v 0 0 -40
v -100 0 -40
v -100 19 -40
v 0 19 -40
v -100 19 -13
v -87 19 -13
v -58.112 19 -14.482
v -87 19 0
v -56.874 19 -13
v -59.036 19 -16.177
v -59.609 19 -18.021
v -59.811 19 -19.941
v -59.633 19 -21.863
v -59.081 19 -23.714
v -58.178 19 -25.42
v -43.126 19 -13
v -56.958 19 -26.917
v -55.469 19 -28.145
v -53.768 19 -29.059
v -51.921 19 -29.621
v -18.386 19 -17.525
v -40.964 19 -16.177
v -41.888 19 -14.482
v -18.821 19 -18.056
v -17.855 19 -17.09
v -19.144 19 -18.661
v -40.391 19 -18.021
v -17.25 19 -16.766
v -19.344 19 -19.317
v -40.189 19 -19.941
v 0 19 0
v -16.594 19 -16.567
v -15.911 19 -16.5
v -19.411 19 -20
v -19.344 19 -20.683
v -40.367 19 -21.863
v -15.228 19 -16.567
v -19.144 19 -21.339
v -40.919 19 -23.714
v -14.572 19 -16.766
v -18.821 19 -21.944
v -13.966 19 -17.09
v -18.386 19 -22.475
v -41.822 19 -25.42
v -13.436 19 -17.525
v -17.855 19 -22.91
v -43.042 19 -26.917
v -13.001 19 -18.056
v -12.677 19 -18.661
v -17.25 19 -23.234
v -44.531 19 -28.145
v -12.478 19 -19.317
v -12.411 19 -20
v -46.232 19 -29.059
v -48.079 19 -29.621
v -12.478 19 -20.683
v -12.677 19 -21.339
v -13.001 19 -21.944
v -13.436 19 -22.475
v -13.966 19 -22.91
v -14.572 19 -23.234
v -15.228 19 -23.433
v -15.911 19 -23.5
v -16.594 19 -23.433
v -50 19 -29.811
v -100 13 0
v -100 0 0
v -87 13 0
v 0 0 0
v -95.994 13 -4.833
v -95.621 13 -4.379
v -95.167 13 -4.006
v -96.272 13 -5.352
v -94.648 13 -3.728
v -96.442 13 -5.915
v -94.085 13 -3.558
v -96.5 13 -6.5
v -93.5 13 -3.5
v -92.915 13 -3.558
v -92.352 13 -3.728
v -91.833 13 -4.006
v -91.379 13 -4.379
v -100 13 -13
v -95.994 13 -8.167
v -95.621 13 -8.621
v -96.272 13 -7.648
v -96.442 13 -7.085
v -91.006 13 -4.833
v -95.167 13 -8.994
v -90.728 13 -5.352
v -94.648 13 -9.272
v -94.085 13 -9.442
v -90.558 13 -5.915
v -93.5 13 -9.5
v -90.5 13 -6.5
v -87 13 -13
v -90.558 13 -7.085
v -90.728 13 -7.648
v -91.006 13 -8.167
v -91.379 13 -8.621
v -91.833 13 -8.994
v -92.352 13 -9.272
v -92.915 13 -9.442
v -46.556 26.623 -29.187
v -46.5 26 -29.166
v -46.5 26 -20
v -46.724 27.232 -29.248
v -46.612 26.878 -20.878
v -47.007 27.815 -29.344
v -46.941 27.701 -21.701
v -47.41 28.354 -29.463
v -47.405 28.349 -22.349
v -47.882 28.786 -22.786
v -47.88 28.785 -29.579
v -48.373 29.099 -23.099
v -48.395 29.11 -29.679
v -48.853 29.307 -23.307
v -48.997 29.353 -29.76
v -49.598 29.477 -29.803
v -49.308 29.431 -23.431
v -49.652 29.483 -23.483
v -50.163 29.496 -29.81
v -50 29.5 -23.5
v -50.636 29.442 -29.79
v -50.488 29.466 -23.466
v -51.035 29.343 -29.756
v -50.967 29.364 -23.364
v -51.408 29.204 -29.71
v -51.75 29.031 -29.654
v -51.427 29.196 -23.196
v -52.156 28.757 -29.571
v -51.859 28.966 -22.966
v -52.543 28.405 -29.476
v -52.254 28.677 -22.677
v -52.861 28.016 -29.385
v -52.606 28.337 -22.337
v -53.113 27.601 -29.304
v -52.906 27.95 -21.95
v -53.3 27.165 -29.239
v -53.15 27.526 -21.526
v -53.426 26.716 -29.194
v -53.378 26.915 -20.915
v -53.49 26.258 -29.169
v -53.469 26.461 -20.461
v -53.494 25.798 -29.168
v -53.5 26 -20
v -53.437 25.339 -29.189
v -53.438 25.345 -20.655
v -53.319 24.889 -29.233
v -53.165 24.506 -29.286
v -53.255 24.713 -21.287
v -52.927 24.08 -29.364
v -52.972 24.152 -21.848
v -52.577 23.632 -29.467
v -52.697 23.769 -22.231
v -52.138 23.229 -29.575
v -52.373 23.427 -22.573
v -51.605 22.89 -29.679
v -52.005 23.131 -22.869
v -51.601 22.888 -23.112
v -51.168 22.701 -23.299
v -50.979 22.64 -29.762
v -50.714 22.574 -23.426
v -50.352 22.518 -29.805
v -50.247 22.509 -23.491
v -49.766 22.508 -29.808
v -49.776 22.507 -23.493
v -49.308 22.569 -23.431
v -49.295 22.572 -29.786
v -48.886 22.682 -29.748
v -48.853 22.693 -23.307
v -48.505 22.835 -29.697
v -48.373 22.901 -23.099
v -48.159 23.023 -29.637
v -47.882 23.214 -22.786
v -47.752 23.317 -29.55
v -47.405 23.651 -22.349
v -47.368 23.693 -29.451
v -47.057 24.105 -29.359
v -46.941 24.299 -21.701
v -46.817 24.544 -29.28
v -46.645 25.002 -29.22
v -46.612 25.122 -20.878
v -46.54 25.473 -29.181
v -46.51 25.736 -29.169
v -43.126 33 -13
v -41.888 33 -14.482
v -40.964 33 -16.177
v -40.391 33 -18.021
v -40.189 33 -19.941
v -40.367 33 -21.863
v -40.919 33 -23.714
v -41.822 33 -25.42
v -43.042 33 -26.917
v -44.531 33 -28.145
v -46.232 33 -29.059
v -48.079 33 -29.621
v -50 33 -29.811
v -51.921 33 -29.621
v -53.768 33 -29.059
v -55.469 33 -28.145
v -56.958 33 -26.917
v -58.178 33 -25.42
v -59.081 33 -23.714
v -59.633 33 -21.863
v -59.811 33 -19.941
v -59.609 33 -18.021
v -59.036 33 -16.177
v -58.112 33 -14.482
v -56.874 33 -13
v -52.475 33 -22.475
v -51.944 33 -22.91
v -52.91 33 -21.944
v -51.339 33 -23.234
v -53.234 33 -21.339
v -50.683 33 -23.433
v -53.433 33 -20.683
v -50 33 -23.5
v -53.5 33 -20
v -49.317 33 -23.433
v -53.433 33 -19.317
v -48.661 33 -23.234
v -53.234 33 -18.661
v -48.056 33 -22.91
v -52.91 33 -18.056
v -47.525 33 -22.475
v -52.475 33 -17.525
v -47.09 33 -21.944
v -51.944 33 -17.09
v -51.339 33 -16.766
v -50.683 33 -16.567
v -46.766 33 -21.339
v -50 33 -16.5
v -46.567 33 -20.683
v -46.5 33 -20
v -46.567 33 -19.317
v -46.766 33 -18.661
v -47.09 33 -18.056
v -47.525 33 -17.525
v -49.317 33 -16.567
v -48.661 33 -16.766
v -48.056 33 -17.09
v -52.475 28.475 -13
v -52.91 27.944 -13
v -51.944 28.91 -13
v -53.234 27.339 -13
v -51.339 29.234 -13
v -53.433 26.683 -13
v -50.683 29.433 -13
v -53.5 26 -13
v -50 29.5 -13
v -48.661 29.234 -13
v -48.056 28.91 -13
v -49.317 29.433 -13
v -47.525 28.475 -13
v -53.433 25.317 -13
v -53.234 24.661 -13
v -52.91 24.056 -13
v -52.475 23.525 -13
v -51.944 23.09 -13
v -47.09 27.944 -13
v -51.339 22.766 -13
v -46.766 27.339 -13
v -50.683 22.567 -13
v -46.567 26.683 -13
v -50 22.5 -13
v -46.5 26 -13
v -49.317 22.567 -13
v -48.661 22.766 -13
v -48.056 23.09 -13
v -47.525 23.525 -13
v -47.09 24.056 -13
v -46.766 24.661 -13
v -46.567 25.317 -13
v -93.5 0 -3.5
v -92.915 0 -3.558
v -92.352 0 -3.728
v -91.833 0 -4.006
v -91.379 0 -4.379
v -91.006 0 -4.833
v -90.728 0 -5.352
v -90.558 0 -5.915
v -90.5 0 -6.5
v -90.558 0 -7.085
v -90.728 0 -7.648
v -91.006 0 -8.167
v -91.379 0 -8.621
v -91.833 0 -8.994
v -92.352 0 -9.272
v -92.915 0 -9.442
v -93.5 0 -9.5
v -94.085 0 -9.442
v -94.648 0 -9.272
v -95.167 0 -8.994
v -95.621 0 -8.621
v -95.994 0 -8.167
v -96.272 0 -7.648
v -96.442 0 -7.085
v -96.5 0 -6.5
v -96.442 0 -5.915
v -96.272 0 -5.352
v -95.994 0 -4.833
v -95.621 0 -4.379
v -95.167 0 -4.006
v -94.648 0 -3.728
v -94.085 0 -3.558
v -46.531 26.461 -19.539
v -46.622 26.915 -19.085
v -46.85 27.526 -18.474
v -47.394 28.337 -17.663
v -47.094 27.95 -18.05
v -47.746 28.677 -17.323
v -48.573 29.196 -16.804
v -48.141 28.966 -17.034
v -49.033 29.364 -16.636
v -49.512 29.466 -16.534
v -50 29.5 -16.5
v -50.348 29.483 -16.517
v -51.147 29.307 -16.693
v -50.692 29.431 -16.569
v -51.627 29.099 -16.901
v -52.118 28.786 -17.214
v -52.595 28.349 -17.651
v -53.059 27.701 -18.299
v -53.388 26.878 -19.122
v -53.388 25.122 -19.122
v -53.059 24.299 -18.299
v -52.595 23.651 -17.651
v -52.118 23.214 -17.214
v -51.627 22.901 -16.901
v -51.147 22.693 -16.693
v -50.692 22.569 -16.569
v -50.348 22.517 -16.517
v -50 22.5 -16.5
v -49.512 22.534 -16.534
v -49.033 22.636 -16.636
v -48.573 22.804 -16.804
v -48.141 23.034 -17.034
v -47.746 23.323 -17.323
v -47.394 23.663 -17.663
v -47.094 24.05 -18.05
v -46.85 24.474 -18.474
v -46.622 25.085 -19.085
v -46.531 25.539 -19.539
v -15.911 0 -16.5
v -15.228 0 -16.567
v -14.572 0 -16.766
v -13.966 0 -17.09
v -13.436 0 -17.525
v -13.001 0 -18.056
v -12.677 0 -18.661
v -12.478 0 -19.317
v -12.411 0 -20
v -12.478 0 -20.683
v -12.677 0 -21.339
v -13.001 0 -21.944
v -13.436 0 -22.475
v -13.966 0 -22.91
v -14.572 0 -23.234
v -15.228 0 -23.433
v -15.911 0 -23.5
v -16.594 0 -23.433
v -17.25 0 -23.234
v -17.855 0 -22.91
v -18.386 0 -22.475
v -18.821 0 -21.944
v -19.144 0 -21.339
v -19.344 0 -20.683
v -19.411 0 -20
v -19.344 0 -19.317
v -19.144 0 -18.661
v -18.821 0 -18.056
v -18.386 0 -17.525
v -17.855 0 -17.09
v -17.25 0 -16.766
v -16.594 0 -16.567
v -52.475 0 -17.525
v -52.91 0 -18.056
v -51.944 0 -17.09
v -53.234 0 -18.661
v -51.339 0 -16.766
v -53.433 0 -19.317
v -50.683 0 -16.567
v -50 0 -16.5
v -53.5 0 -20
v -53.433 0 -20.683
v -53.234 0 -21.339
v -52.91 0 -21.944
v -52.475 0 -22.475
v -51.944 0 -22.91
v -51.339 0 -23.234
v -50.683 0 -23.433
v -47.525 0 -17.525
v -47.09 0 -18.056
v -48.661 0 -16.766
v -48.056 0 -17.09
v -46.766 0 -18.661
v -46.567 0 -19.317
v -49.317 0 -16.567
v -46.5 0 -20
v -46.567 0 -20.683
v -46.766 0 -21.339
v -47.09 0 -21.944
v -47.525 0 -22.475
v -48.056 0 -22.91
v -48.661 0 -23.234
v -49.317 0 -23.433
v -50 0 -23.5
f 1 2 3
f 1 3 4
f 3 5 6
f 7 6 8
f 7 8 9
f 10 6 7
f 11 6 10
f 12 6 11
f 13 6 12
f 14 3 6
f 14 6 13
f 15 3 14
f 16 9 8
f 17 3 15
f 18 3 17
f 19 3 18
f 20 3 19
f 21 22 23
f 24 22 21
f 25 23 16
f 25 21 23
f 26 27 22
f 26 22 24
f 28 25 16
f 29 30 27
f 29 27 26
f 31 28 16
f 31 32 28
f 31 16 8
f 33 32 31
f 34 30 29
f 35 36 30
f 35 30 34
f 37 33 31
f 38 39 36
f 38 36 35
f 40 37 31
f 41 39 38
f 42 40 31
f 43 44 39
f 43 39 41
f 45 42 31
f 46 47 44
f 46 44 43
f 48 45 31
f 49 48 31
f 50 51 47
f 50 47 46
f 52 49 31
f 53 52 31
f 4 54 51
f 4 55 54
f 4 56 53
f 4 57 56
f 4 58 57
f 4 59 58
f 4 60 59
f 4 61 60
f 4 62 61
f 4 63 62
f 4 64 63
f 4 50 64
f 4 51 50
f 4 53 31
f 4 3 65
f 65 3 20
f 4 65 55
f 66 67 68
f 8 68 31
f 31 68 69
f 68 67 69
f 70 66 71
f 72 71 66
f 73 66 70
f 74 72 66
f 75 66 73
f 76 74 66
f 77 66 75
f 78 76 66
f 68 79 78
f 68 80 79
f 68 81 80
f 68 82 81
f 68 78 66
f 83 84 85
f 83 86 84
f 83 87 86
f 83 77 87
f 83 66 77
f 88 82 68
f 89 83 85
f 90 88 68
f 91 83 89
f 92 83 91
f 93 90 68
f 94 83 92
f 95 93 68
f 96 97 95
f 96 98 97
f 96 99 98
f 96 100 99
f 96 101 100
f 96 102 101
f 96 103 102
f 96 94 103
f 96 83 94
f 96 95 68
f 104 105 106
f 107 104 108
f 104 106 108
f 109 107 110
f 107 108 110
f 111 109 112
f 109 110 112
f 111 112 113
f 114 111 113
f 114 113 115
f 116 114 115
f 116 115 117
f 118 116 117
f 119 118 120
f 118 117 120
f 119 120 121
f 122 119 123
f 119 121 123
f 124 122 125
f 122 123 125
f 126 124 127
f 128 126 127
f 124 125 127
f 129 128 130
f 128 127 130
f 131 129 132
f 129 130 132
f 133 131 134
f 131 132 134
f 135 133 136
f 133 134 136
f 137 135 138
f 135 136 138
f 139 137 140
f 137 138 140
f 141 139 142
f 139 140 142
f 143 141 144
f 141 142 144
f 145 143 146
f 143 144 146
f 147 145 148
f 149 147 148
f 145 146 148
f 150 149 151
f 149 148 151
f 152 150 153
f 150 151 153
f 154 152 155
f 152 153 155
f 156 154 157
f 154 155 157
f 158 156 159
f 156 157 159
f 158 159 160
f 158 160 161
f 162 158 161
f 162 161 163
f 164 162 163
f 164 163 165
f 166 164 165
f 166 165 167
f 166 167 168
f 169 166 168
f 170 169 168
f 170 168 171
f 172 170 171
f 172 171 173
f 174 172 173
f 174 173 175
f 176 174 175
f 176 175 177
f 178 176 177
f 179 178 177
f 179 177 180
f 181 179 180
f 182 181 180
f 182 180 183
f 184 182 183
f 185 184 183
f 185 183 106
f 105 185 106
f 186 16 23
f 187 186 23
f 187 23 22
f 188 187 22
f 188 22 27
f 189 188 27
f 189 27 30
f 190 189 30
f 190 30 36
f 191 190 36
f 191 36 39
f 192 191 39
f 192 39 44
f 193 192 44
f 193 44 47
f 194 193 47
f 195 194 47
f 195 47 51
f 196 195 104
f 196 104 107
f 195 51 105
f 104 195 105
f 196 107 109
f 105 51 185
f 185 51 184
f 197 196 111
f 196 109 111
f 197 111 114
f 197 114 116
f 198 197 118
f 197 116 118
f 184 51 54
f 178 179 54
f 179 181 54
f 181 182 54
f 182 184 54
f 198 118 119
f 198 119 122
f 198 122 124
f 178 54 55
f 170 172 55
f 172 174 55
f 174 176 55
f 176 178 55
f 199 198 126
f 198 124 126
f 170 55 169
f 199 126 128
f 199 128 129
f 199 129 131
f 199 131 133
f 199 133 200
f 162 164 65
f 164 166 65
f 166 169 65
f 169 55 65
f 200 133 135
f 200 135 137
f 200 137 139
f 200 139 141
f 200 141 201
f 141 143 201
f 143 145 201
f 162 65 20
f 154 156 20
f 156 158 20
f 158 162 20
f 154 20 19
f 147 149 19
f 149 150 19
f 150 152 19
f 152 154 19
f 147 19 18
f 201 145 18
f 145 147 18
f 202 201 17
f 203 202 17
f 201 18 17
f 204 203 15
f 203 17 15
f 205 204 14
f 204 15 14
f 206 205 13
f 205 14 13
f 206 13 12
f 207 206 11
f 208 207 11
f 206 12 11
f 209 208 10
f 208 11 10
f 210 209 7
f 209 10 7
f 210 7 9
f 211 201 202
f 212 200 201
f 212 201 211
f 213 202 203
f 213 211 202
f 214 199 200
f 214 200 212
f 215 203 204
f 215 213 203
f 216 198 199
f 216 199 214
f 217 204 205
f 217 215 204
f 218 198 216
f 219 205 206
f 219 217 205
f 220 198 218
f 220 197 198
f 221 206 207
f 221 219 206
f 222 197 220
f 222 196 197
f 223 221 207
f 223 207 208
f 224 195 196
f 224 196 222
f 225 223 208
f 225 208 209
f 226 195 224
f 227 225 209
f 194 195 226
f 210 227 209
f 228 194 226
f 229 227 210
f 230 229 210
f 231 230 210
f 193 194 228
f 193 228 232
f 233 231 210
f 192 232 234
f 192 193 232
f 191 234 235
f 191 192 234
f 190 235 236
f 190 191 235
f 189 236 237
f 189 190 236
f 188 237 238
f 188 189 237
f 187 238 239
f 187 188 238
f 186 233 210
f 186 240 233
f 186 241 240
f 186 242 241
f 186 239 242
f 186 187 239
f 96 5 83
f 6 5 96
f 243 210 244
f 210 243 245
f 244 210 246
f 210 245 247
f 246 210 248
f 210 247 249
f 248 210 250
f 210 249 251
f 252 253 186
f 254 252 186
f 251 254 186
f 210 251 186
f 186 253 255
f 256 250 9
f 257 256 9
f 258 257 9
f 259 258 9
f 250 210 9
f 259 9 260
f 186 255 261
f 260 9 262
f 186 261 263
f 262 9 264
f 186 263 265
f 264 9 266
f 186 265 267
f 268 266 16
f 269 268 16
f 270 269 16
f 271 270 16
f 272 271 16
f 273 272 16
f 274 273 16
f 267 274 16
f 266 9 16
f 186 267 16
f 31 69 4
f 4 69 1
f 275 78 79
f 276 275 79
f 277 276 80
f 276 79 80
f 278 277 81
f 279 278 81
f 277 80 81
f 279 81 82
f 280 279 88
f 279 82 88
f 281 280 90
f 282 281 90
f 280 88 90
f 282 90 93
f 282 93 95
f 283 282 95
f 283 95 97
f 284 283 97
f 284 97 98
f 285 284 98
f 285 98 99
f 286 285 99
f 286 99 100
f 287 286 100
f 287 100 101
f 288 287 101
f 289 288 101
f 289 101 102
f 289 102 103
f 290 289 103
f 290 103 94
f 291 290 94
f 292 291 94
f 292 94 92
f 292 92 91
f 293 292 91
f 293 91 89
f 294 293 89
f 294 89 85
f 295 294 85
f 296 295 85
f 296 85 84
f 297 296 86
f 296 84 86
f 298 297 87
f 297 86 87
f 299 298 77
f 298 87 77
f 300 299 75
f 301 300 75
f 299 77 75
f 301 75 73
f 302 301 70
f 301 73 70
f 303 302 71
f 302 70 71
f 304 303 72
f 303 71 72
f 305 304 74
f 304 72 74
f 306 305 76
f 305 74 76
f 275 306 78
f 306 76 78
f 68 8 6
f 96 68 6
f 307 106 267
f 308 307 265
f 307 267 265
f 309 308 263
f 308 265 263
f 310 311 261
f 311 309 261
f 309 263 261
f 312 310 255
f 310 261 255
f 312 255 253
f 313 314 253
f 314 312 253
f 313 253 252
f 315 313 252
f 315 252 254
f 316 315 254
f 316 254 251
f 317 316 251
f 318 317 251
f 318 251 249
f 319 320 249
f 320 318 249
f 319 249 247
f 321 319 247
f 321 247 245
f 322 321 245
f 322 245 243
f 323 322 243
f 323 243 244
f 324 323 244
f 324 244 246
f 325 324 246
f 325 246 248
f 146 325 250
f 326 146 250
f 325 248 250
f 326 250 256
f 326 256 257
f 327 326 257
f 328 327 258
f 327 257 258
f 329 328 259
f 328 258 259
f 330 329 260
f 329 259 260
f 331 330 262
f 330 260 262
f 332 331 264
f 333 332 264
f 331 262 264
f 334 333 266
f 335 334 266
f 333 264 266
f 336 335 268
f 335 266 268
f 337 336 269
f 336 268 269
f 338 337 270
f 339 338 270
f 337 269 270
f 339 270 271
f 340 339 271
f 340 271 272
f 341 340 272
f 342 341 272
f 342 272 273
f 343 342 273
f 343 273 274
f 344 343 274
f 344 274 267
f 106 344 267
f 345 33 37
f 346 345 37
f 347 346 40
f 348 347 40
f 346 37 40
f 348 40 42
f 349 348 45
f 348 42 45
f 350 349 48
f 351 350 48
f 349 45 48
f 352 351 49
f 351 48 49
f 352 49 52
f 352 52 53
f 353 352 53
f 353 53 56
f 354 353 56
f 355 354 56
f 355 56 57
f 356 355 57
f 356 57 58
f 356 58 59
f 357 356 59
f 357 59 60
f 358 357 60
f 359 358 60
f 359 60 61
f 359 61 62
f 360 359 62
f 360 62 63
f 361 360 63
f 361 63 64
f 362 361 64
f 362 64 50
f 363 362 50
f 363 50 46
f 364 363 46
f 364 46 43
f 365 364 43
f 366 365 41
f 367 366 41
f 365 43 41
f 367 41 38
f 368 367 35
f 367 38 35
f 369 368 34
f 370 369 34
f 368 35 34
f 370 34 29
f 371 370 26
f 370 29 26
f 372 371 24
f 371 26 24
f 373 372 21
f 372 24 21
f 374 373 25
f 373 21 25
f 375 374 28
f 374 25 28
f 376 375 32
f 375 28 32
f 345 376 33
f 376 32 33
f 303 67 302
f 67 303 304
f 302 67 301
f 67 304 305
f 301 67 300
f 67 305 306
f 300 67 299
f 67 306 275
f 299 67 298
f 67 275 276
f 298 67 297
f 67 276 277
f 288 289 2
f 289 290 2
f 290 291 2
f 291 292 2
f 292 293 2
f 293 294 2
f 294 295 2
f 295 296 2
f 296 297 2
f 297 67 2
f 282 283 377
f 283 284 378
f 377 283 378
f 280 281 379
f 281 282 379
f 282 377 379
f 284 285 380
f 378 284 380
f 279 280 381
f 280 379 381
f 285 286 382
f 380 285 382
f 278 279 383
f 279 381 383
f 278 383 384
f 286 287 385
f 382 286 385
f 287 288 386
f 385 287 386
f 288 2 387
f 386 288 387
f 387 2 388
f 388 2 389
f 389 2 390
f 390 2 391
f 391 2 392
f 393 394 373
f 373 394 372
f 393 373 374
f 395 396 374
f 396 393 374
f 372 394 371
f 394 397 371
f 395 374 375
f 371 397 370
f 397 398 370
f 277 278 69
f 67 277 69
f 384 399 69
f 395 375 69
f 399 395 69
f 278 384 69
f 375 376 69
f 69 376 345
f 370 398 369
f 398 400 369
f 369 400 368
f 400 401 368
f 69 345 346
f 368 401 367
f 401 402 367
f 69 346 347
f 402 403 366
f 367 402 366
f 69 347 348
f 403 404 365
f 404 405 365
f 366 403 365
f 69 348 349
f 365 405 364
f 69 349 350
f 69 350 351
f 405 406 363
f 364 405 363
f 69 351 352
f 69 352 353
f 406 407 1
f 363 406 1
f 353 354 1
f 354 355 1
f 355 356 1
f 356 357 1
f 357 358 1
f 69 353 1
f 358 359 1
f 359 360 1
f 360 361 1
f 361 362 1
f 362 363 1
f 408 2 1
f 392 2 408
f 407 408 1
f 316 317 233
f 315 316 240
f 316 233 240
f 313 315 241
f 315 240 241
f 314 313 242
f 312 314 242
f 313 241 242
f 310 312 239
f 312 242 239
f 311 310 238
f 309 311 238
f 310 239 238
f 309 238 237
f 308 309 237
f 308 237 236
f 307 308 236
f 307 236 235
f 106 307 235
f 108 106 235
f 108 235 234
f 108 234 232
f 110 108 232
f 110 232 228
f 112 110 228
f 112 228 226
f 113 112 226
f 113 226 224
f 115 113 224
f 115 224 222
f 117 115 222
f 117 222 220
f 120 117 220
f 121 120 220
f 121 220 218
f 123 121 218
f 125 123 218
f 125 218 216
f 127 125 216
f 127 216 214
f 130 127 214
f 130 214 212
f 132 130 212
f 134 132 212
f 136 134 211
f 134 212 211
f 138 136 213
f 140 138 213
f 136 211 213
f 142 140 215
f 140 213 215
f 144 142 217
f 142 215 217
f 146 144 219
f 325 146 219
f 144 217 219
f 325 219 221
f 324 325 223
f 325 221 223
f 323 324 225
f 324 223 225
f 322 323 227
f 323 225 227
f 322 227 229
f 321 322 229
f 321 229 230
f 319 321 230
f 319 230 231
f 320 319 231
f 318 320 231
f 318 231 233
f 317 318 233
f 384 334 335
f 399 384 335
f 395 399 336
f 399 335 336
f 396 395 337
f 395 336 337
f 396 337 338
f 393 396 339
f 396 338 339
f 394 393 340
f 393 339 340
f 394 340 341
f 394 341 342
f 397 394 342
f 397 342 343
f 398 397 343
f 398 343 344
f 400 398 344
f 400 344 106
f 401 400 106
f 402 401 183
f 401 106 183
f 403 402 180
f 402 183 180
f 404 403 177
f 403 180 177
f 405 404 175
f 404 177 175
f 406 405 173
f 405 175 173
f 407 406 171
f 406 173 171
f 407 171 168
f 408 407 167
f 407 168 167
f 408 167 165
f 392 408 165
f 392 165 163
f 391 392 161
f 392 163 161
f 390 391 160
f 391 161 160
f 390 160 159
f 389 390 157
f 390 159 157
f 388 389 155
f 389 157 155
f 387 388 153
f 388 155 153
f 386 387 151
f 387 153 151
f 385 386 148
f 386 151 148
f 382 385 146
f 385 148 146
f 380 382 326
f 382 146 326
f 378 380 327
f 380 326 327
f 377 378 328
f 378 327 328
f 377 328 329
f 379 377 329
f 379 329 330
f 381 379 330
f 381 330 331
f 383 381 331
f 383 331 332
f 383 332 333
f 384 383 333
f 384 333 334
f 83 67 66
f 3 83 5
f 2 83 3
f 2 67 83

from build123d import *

# Parameters (mm, degrees)
SKETCH_1_W          = 100
SKETCH_1_H          = 40
EXTRUDE_1_DEPTH     = 19
SKETCH_2_R          = 9.811124868
EXTRUDE_2_DEPTH     = 14
SKETCH_3_W          = 13
SKETCH_3_H          = 13
CUT_EXTRUDE_1_DEPTH = 6
SKETCH_4_R          = 3
CUT_EXTRUDE_2_DEPTH = 110.544511501
SKETCH_5_R          = 3.5
CUT_EXTRUDE_3_DEPTH = 113.645461515
SKETCH_6_R          = 3.5
CUT_EXTRUDE_4_DEPTH = 110.366356801
SKETCH_7_W          = 87
SKETCH_7_H          = 13
CUT_EXTRUDE_6_DEPTH = 31
SKETCH_8_R          = 3.5
CUT_EXTRUDE_7_DEPTH = 109.710625056


with BuildPart() as part:
    # Эскиз1 → Бобышка-Вытянуть1 (new body)
    with BuildSketch(Plane(origin=(0, 0, 0), x_dir=(1, 0, 0), z_dir=(0, 1, 0))):
        with Locations((-50, 20)):
            Rectangle(SKETCH_1_W, SKETCH_1_H)
    extrude(amount=EXTRUDE_1_DEPTH)

    # Эскиз2 → Бобышка-Вытянуть2 (add)
    with BuildSketch(Plane(origin=(0, 19, 0), x_dir=(1, 0, 0), z_dir=(0, 1, 0))):
        with Locations(Location((-50, 20, 0), (0, 0, 270))):
            Circle(SKETCH_2_R)
    extrude(amount=EXTRUDE_2_DEPTH)

    # Эскиз3 → Вырез-Вытянуть1 (cut)
    with BuildSketch(Plane(origin=(0, 19, 0), x_dir=(1, 0, 0), z_dir=(0, 1, 0))):
        with Locations((-93.5, 6.5)):
            Rectangle(SKETCH_3_W, SKETCH_3_H)
    extrude(amount=-CUT_EXTRUDE_1_DEPTH, mode=Mode.SUBTRACT)

    # Эскиз4 → Вырез-Вытянуть2 (cut, through all)
    with BuildSketch(Plane(origin=(0, 13, 0), x_dir=(1, 0, 0), z_dir=(0, 1, 0))):
        with Locations(Location((-93.5, 6.5, 0), (0, 0, 270))):
            Circle(SKETCH_4_R)
    extrude(amount=-CUT_EXTRUDE_2_DEPTH, mode=Mode.SUBTRACT)

    # Эскиз5 → Вырез-Вытянуть3 (cut, through all)
    with BuildSketch(Plane(origin=(0, 33, 0), x_dir=(1, 0, 0), z_dir=(0, 1, 0))):
        with Locations(Location((-50, 20, 0), (0, 0, 270))):
            Circle(SKETCH_5_R)
    extrude(amount=-CUT_EXTRUDE_3_DEPTH, mode=Mode.SUBTRACT)

    # Эскиз6 → Вырез-Вытянуть4 (cut, through all)
    with BuildSketch(Plane(origin=(0, 19, 0), x_dir=(1, 0, 0), z_dir=(0, 1, 0))):
        with Locations(Location((-15.91089824, 20, 0), (0, 0, 270))):
            Circle(SKETCH_6_R)
    extrude(amount=-CUT_EXTRUDE_4_DEPTH, mode=Mode.SUBTRACT)

    # Эскиз7 → Вырез-Вытянуть6 (cut)
    with BuildSketch(Plane(origin=(0, 19, 0), x_dir=(1, 0, 0), z_dir=(0, 1, 0))):
        with Locations((-43.5, 6.5)):
            Rectangle(SKETCH_7_W, SKETCH_7_H)
    extrude(amount=CUT_EXTRUDE_6_DEPTH, mode=Mode.SUBTRACT)

    # Эскиз8 → Вырез-Вытянуть7 (cut, through all)
    with BuildSketch(Plane.XY.offset(-13)):
        with Locations((-50, 26)):
            Circle(SKETCH_8_R)
    extrude(amount=-CUT_EXTRUDE_7_DEPTH, mode=Mode.SUBTRACT)


solid = part.part
